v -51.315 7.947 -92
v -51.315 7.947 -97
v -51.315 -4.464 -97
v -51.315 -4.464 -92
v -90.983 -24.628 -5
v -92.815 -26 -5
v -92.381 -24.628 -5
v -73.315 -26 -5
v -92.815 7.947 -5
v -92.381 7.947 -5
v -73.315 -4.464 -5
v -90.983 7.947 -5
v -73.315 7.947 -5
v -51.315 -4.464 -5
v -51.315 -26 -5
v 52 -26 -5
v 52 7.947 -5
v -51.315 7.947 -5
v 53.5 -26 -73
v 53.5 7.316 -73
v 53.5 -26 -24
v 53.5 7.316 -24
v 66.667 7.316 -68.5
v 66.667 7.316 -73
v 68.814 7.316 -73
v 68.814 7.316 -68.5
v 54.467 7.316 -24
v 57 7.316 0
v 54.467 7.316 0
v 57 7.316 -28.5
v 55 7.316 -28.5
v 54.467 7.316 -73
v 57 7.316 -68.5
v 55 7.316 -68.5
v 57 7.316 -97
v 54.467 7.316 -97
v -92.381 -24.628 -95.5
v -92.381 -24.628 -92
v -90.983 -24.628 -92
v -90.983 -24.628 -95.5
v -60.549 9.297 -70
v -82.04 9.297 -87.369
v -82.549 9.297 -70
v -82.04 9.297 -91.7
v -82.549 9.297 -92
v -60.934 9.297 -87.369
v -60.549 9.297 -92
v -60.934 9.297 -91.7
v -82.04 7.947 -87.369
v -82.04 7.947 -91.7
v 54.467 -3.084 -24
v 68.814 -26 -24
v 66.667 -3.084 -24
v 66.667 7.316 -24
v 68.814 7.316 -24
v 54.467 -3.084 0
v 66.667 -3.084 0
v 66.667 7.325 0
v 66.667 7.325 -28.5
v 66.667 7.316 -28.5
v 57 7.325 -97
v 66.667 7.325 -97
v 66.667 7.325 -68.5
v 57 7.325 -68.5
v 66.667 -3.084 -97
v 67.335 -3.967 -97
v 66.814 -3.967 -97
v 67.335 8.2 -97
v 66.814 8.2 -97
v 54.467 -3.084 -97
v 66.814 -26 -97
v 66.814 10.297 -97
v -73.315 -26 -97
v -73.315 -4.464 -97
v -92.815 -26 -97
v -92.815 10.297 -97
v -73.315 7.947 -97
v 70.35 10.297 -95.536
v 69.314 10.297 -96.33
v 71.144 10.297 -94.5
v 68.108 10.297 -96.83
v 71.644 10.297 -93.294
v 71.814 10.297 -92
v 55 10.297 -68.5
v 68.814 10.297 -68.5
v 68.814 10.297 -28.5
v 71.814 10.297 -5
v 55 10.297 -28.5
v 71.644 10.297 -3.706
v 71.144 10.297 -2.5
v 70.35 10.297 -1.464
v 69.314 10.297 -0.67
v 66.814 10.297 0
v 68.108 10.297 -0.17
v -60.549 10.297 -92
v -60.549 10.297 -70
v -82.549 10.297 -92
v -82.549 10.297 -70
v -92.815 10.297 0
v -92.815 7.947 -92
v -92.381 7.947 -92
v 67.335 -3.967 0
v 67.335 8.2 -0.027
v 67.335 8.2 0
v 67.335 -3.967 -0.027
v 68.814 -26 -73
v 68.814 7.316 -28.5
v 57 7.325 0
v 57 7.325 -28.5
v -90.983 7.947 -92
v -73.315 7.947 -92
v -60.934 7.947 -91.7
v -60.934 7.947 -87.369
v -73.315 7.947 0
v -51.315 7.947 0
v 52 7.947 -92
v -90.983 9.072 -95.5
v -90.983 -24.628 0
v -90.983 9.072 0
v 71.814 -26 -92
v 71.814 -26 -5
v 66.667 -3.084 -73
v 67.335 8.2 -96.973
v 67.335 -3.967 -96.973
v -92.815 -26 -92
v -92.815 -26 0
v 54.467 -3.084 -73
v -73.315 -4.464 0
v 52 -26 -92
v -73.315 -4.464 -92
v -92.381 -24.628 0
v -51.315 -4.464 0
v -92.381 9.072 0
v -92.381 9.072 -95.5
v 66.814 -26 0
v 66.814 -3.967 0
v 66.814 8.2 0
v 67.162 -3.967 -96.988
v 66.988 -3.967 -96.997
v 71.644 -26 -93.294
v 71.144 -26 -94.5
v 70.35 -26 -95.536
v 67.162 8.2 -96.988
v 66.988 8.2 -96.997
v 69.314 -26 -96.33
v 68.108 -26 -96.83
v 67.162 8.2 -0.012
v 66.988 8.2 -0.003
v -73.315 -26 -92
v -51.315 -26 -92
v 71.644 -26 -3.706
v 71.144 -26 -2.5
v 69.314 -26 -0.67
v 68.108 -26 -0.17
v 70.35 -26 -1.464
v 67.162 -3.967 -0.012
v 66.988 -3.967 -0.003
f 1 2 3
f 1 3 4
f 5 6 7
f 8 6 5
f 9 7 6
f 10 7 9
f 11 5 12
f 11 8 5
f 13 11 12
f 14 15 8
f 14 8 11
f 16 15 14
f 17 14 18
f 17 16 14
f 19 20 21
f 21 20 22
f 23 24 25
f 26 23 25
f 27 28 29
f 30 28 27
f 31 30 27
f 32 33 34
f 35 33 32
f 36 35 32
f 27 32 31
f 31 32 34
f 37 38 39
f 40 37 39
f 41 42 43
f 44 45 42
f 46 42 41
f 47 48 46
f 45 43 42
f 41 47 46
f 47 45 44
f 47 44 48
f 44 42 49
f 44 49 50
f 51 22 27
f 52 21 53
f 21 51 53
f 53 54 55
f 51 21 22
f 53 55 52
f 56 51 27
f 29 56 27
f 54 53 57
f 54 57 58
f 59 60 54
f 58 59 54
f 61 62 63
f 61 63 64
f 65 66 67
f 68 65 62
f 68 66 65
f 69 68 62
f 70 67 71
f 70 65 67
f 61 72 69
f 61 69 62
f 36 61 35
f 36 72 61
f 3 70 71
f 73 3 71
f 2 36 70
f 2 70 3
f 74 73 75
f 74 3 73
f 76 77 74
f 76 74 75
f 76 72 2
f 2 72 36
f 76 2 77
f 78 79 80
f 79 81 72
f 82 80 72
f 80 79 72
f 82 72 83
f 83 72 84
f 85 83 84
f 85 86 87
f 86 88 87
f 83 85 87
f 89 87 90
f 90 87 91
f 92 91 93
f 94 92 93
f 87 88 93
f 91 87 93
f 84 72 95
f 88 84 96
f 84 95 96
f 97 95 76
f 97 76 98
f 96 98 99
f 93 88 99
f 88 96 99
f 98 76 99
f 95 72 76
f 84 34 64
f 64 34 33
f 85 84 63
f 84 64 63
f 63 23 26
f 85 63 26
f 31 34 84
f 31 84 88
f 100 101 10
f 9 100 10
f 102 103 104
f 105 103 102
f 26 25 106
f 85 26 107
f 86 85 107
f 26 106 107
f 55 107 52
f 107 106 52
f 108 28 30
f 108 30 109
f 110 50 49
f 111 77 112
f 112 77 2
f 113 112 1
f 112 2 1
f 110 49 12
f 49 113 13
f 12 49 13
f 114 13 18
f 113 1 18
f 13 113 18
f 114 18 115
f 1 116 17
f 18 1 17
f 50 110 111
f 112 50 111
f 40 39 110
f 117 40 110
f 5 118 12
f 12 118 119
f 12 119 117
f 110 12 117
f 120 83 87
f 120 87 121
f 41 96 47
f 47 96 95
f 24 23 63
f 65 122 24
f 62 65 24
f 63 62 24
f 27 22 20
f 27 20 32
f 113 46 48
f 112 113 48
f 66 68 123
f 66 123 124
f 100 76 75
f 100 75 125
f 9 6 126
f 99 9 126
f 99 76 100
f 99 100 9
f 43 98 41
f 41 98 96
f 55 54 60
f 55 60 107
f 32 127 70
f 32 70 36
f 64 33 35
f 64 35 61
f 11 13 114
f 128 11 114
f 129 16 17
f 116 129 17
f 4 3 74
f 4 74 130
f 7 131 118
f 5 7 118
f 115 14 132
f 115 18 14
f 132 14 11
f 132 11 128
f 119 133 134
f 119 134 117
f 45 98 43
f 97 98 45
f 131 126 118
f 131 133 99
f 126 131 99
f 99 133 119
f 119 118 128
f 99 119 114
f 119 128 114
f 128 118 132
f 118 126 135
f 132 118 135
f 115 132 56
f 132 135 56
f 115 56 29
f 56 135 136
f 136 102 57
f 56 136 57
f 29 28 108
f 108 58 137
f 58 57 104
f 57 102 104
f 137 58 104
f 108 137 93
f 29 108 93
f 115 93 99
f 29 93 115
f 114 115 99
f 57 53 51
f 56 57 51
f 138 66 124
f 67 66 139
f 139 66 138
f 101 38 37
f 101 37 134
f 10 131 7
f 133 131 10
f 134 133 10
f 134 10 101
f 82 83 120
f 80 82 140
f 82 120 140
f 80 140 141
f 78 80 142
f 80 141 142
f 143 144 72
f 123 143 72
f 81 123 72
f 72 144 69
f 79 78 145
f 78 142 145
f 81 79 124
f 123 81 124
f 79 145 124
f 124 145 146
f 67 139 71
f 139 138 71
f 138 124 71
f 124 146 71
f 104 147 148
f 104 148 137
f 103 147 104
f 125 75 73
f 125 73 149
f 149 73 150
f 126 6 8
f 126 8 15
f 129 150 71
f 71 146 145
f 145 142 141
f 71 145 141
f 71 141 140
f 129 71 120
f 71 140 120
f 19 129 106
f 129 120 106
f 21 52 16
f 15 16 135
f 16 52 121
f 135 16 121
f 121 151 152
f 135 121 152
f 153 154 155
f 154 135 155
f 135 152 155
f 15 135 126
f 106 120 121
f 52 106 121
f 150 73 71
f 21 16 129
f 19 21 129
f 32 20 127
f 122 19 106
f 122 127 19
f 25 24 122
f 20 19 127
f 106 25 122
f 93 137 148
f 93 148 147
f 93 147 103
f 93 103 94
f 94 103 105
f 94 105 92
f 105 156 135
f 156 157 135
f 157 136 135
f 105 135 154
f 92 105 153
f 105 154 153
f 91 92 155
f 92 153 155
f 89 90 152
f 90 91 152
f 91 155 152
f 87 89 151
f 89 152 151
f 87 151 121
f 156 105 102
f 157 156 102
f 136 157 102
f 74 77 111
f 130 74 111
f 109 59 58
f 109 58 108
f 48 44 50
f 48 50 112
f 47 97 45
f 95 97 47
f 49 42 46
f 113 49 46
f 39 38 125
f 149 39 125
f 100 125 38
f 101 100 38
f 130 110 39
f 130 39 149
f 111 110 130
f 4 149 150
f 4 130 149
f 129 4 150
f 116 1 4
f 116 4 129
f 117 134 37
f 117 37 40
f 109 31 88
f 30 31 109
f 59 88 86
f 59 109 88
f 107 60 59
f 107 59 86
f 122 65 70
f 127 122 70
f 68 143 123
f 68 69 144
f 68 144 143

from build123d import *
from build123d.topology import SkipClean

# Parameters (mm, degrees)
CROQUIS1_W              = 114
CROQUIS1_H              = 34.2
SALIENTE_EXTRUIR1_DEPTH = 97
VACIADO1_T              = -5
SALIENTE_EXTRUIR2_DEPTH = 97
CORTAR_EXTRUIR1_REACH   = 128.031
CROQUIS3_W              = 13.814275766
CROQUIS3_H              = 40
REDONDEO2_R             = 5
CROQUIS6_W              = 12.3
CROQUIS6_H              = 10.4
CORTAR_EXTRUIR3_DEPTH   = 124.459670354
SALIENTE_EXTRUIR3_DEPTH = 97
CROQUIS8_W              = 13.814275766
CROQUIS8_H              = 40
CORTAR_EXTRUIR4_DEPTH   = 127.030661617
CROQUIS9_W              = 104
CROQUIS9_H              = 87
CORTAR_EXTRUIR5_DEPTH   = 10
CORTAR_EXTRUIR6_START   = -33.316303
CROQUIS11_W             = 1.5
CROQUIS11_H             = 39.999512223
CROQUIS11_H_2           = 40
CORTAR_EXTRUIR6_DEPTH   = 33.316303
CORTAR_EXTRUIR7_START   = -33.316303
CROQUIS13_W             = 15.314275766
CROQUIS13_H             = 4.5
CORTAR_EXTRUIR7_DEPTH   = 33.316303
CROQUIS14_W             = 40
CROQUIS14_H             = 2.980218128
SALIENTE_EXTRUIR4_DEPTH = 15.498885391
CORTAR_EXTRUIR8_DEPTH   = 20.498885391
CROQUIS19_W             = 5
CROQUIS19_H             = 21.536410229
CROQUIS19_H_2           = 2.349460024
SALIENTE_EXTRUIR5_DEPTH = 22
CROQUIS20_W             = 5
CROQUIS20_H             = 36.296521374
SALIENTE_EXTRUIR6_DEPTH = 19.5
CROQUIS21_W             = 87
CROQUIS21_H             = 2.349460024
SALIENTE_EXTRUIR7_DEPTH = 144.815390375
CROQUIS23_W             = 1.39816901
CROQUIS23_H             = 33.700902132
CORTAR_EXTRUIR9_DEPTH   = 95.5
CROQUIS24_W             = 22.493754325
CROQUIS24_H             = 22.211308676
CORTAR_EXTRUIR10_DEPTH  = 1.5
CROQUIS25_W             = 5.544572311
CROQUIS25_H             = 16.748281631
CORTAR_EXTRUIR11_DEPTH  = 1.5
SALIENTE_EXTRUIR8_DEPTH = 46
CROQUIS27_W             = 22
CROQUIS27_H             = 22
CORTAR_EXTRUIR12_DEPTH  = 1
CROQUIS28_W             = 21.106040847
CROQUIS28_H             = 4.330702007
CORTAR_EXTRUIR14_DEPTH  = 1.5


with BuildPart() as part:
    # Croquis1 → Saliente-Extruir1 (new body)
    with BuildSketch(Plane.XY):
        with Locations((0, -8.9)):
            Rectangle(CROQUIS1_W, CROQUIS1_H)
    extrude(amount=-SALIENTE_EXTRUIR1_DEPTH)

    # Vaciado1
    vaciado1_openings = [part.faces().sort_by_distance(p)[0] for p in [
        (0, -26, -48.5),
    ]]
    offset(amount=VACIADO1_T, openings=vaciado1_openings, kind=Kind.INTERSECTION)

    # Croquis2 → Saliente-Extruir2 (add, through all)
    with BuildSketch(Plane(origin=(0, 0, -97), x_dir=(-1, 0, 0), z_dir=(0, 0, -1))):
        Polygon((71.814275766, 8.2), (67.33466189, 8.2), (67.33466189, -3.967393508), (57, -3.967393508), (57, -26), (67.33466189, -26), (71.814275766, -26), align=None)
        Polygon((-57, 8.2), (57, 8.2), (67.33466189, 8.2), (71.814275766, 8.2), (71.814275766, 10.296521374), (-71.814275766, 10.296521374), (-71.814275766, 8.2), (-67.33466189, 8.2), align=None)
        Polygon((-67.33466189, -3.967393508), (-67.33466189, 8.2), (-71.814275766, 8.2), (-71.814275766, -26), (-67.33466189, -26), (-57, -26), (-57, -3.967393508), align=None)
    extrude(amount=-SALIENTE_EXTRUIR2_DEPTH)

    # Croquis3 → Cortar-Extruir1 (cut, up to next)
    with BuildSketch(Plane.XZ.offset(26), mode=Mode.PRIVATE) as cortar_extruir1_sk1:
        with Locations((-61.907137883, -48.5)):
            Rectangle(CROQUIS3_W, CROQUIS3_H)
    cortar_extruir1_tool1 = extrude(cortar_extruir1_sk1.sketch, amount=-CORTAR_EXTRUIR1_REACH, mode=Mode.PRIVATE) & part.part
    # Croquis3 → Cortar-Extruir1 (cut, up to next)
    with BuildSketch(Plane.XZ.offset(26), mode=Mode.PRIVATE) as cortar_extruir1_sk2:
        with Locations((61.907137883, -48.5)):
            Rectangle(CROQUIS3_W, CROQUIS3_H)
    cortar_extruir1_tool2 = extrude(cortar_extruir1_sk2.sketch, amount=-CORTAR_EXTRUIR1_REACH, mode=Mode.PRIVATE) & part.part
    add(cortar_extruir1_tool1.solids().sort_by_distance((-61.907138, -26, -48.5))[0], mode=Mode.SUBTRACT)
    add(cortar_extruir1_tool2.solids().sort_by_distance((61.907138, -26, -48.5))[0], mode=Mode.SUBTRACT)

    # Redondeo2
    # the kernel refuses this fillet: 5 mm, written as the material it takes off along each edge
    with BuildSketch(Plane(origin=(71.814275766, -38.5, -97), x_dir=(0, 0, 1), z_dir=(0, 1, 0)), Plane(origin=(71.814275766, -38.5, 0), x_dir=(-1, 0, 0), z_dir=(0, 1, 0)), Plane(origin=(-71.814275766, 22.796521374, -97), x_dir=(0, 0, 1), z_dir=(0, -1, 0)), Plane(origin=(-71.814275766, 22.796521374, 0), x_dir=(1, 0, 0), z_dir=(0, -1, 0))) as redondeo2_piece_1:
        with BuildLine():
            CenterArc((REDONDEO2_R, -REDONDEO2_R), REDONDEO2_R, 90, 90)
            Line((0, -REDONDEO2_R), (0, 0))
            Line((0, 0), (REDONDEO2_R, 0))
        make_face()
    extrude(amount=61.296521374, mode=Mode.SUBTRACT)

    # Croquis6 → Cortar-Extruir3 (cut, through all)
    with BuildSketch(Plane(origin=(0, 0, -97), x_dir=(-1, 0, 0), z_dir=(0, 0, -1))):
        with Locations((-60.617330945, 2.116303246)):
            Rectangle(CROQUIS6_W, CROQUIS6_H)
        with Locations((60.617330945, 2.116303246)):
            Rectangle(CROQUIS6_W, CROQUIS6_H)
    extrude(amount=-CORTAR_EXTRUIR3_DEPTH, mode=Mode.SUBTRACT)

    # Croquis7 → Saliente-Extruir3 (add, through all)
    with BuildSketch(Plane(origin=(0, 0, -97), x_dir=(-1, 0, 0), z_dir=(0, 0, -1))):
        Polygon((57, 8.2), (57, 7.316303246), (66.667330945, 7.316303246), (66.667330945, -3.083696754), (57, -3.083696754), (57, -3.967393508), (66.814275766, -3.967393508), (67.33466189, -3.967393508), (67.33466189, 8.2), (66.814275766, 8.2), align=None)
        Polygon((-66.667330945, 7.32503221), (-57, 7.32503221), (-57, 8.2), (-66.814275766, 8.2), (-67.33466189, 8.2), (-67.33466189, -3.967393508), (-66.814275766, -3.967393508), (-57, -3.967393508), (-57, -3.083696754), (-66.667330945, -3.083696754), align=None)
    extrude(amount=-SALIENTE_EXTRUIR3_DEPTH)

    # Croquis8 → Cortar-Extruir4 (cut, through all)
    with BuildSketch(Plane(origin=(0, 10.296521374, 0), x_dir=(1, 0, 0), z_dir=(0, 1, 0))):
        with Locations((-61.907137883, 48.5)):
            Rectangle(CROQUIS8_W, CROQUIS8_H)
        with Locations((61.907137883, 48.5)):
            Rectangle(CROQUIS8_W, CROQUIS8_H)
    extrude(amount=-CORTAR_EXTRUIR4_DEPTH, mode=Mode.SUBTRACT)

    # Croquis9 → Cortar-Extruir5 (cut)
    with BuildSketch(Plane.XZ.offset(-3.2)):
        with Locations((0, -48.5)):
            Rectangle(CROQUIS9_W, CROQUIS9_H)
    extrude(amount=-CORTAR_EXTRUIR5_DEPTH, mode=Mode.SUBTRACT)

    # Croquis11 → Cortar-Extruir6 (cut)
    with SkipClean():  # the faces are left unmerged after this step: merging them gives an invalid solid
        with BuildSketch(Plane.XZ.offset(26).offset(CORTAR_EXTRUIR6_START)):
            with Locations((54.25, -48.499756112)):
                Rectangle(CROQUIS11_W, CROQUIS11_H)
            with Locations((-54.25, -48.5)):
                Rectangle(CROQUIS11_W, CROQUIS11_H_2)
        extrude(amount=CORTAR_EXTRUIR6_DEPTH, mode=Mode.SUBTRACT)

    # Croquis13 → Cortar-Extruir7 (cut)
    with BuildSketch(Plane.XZ.offset(26).offset(CORTAR_EXTRUIR7_START)):
        with Locations((-61.157137883, -26.25)):
            Rectangle(CROQUIS13_W, CROQUIS13_H)
        with Locations((-61.157137883, -70.75)):
            Rectangle(CROQUIS13_W, CROQUIS13_H)
        with Locations((61.157137883, -26.25)):
            Rectangle(CROQUIS13_W, CROQUIS13_H)
        with Locations((61.157137883, -70.749512223)):
            Rectangle(CROQUIS13_W, CROQUIS13_H)
    extrude(amount=CORTAR_EXTRUIR7_DEPTH, mode=Mode.SUBTRACT)

    # Croquis14 → Saliente-Extruir4 (add)
    with BuildSketch(Plane.ZY.offset(55)):
        with Locations((-48.5, 8.80641231)):
            Rectangle(CROQUIS14_W, CROQUIS14_H)
    extrude(amount=SALIENTE_EXTRUIR4_DEPTH)

    # Croquis16 → Cortar-Extruir8 (cut)
    with BuildSketch(Plane.ZY.offset(71.814275766)):
        Polygon((-5, 10.296521374), (-98.41592061, 10.296521374), (-98.41592061, -27.13789471), (0, -27.13789471), (0, 10.296521374), align=None)
    extrude(amount=-CORTAR_EXTRUIR8_DEPTH, mode=Mode.SUBTRACT)

    # Croquis19 → Saliente-Extruir5 (add)
    with BuildSketch(Plane.ZY.offset(51.315390375)):
        with Locations((-2.5, -15.231794886)):
            Rectangle(CROQUIS19_W, CROQUIS19_H)
        with Locations((-94.5, -15.231794886)):
            Rectangle(CROQUIS19_W, CROQUIS19_H)
        with Locations((-2.5, 9.121791362)):
            Rectangle(CROQUIS19_W, CROQUIS19_H_2)
        with Locations((-94.5, 9.121791362)):
            Rectangle(CROQUIS19_W, CROQUIS19_H_2)
    extrude(amount=SALIENTE_EXTRUIR5_DEPTH)

    # Croquis20 → Saliente-Extruir6 (add)
    with BuildSketch(Plane.ZY.offset(73.315390375)):
        with Locations((-2.5, -7.851739313)):
            Rectangle(CROQUIS20_W, CROQUIS20_H)
        with Locations((-94.5, -7.851739313)):
            Rectangle(CROQUIS20_W, CROQUIS20_H)
    extrude(amount=SALIENTE_EXTRUIR6_DEPTH)

    # Croquis21 → Saliente-Extruir7 (add)
    with BuildSketch(Plane.ZY.offset(-52)):
        with Locations((-48.5, 9.121791362)):
            Rectangle(CROQUIS21_W, CROQUIS21_H)
    extrude(amount=SALIENTE_EXTRUIR7_DEPTH)

    # Croquis23 → Cortar-Extruir9 (cut)
    with BuildSketch(Plane.XY):
        with Locations((-91.682194084, -7.778032427)):
            Rectangle(CROQUIS23_W, CROQUIS23_H)
    extrude(amount=-CORTAR_EXTRUIR9_DEPTH, mode=Mode.SUBTRACT)

    # Croquis24 → Cortar-Extruir10 (cut)
    with BuildSketch(Plane(origin=(0, 10.296521374, 0), x_dir=(1, 0, 0), z_dir=(0, 1, 0))):
        with Locations((-78.515448222, 48.5)):
            Rectangle(CROQUIS24_W, CROQUIS24_H)
    extrude(amount=-CORTAR_EXTRUIR10_DEPTH, mode=Mode.SUBTRACT)

    # Croquis25 → Cortar-Extruir11 (cut)
    with BuildSketch(Plane(origin=(0, 8.796521374, 0), x_dir=(1, 0, 0), z_dir=(0, 1, 0))):
        with Locations((-86.990039229, 48.639589487)):
            Rectangle(CROQUIS25_W, CROQUIS25_H)
    extrude(amount=-CORTAR_EXTRUIR11_DEPTH, mode=Mode.SUBTRACT)

    # Croquis26 → Saliente-Extruir8 (add)
    with BuildSketch(Plane(origin=(-89.762325384, 0, 0), x_dir=(0, 0, -1), z_dir=(1, 0, 0))):
        Polygon((59.605654338, 10.296521374), (37.394345662, 10.296521374), (37.394345662, 8.796521374), (40.265448671, 8.796521374), (40.265448671, 7.94706135), (57.013730302, 7.94706135), (57.013730302, 8.796521374), (59.605654338, 8.796521374), align=None)
    extrude(amount=SALIENTE_EXTRUIR8_DEPTH)

    # Croquis27 → Cortar-Extruir12 (cut)
    with BuildSketch(Plane(origin=(0, 10.296521374, 0), x_dir=(1, 0, 0), z_dir=(0, 1, 0))):
        with Locations((-71.548762692, 81)):
            Rectangle(CROQUIS27_W, CROQUIS27_H)
    extrude(amount=-CORTAR_EXTRUIR12_DEPTH, mode=Mode.SUBTRACT)

    # Croquis28 → Cortar-Extruir14 (cut)
    with BuildSketch(Plane(origin=(0, 9.296521374, 0), x_dir=(1, 0, 0), z_dir=(0, 1, 0))):
        with Locations((-71.487233446, 89.534648997)):
            Rectangle(CROQUIS28_W, CROQUIS28_H)
    extrude(amount=-CORTAR_EXTRUIR14_DEPTH, mode=Mode.SUBTRACT)


solid = part.part
